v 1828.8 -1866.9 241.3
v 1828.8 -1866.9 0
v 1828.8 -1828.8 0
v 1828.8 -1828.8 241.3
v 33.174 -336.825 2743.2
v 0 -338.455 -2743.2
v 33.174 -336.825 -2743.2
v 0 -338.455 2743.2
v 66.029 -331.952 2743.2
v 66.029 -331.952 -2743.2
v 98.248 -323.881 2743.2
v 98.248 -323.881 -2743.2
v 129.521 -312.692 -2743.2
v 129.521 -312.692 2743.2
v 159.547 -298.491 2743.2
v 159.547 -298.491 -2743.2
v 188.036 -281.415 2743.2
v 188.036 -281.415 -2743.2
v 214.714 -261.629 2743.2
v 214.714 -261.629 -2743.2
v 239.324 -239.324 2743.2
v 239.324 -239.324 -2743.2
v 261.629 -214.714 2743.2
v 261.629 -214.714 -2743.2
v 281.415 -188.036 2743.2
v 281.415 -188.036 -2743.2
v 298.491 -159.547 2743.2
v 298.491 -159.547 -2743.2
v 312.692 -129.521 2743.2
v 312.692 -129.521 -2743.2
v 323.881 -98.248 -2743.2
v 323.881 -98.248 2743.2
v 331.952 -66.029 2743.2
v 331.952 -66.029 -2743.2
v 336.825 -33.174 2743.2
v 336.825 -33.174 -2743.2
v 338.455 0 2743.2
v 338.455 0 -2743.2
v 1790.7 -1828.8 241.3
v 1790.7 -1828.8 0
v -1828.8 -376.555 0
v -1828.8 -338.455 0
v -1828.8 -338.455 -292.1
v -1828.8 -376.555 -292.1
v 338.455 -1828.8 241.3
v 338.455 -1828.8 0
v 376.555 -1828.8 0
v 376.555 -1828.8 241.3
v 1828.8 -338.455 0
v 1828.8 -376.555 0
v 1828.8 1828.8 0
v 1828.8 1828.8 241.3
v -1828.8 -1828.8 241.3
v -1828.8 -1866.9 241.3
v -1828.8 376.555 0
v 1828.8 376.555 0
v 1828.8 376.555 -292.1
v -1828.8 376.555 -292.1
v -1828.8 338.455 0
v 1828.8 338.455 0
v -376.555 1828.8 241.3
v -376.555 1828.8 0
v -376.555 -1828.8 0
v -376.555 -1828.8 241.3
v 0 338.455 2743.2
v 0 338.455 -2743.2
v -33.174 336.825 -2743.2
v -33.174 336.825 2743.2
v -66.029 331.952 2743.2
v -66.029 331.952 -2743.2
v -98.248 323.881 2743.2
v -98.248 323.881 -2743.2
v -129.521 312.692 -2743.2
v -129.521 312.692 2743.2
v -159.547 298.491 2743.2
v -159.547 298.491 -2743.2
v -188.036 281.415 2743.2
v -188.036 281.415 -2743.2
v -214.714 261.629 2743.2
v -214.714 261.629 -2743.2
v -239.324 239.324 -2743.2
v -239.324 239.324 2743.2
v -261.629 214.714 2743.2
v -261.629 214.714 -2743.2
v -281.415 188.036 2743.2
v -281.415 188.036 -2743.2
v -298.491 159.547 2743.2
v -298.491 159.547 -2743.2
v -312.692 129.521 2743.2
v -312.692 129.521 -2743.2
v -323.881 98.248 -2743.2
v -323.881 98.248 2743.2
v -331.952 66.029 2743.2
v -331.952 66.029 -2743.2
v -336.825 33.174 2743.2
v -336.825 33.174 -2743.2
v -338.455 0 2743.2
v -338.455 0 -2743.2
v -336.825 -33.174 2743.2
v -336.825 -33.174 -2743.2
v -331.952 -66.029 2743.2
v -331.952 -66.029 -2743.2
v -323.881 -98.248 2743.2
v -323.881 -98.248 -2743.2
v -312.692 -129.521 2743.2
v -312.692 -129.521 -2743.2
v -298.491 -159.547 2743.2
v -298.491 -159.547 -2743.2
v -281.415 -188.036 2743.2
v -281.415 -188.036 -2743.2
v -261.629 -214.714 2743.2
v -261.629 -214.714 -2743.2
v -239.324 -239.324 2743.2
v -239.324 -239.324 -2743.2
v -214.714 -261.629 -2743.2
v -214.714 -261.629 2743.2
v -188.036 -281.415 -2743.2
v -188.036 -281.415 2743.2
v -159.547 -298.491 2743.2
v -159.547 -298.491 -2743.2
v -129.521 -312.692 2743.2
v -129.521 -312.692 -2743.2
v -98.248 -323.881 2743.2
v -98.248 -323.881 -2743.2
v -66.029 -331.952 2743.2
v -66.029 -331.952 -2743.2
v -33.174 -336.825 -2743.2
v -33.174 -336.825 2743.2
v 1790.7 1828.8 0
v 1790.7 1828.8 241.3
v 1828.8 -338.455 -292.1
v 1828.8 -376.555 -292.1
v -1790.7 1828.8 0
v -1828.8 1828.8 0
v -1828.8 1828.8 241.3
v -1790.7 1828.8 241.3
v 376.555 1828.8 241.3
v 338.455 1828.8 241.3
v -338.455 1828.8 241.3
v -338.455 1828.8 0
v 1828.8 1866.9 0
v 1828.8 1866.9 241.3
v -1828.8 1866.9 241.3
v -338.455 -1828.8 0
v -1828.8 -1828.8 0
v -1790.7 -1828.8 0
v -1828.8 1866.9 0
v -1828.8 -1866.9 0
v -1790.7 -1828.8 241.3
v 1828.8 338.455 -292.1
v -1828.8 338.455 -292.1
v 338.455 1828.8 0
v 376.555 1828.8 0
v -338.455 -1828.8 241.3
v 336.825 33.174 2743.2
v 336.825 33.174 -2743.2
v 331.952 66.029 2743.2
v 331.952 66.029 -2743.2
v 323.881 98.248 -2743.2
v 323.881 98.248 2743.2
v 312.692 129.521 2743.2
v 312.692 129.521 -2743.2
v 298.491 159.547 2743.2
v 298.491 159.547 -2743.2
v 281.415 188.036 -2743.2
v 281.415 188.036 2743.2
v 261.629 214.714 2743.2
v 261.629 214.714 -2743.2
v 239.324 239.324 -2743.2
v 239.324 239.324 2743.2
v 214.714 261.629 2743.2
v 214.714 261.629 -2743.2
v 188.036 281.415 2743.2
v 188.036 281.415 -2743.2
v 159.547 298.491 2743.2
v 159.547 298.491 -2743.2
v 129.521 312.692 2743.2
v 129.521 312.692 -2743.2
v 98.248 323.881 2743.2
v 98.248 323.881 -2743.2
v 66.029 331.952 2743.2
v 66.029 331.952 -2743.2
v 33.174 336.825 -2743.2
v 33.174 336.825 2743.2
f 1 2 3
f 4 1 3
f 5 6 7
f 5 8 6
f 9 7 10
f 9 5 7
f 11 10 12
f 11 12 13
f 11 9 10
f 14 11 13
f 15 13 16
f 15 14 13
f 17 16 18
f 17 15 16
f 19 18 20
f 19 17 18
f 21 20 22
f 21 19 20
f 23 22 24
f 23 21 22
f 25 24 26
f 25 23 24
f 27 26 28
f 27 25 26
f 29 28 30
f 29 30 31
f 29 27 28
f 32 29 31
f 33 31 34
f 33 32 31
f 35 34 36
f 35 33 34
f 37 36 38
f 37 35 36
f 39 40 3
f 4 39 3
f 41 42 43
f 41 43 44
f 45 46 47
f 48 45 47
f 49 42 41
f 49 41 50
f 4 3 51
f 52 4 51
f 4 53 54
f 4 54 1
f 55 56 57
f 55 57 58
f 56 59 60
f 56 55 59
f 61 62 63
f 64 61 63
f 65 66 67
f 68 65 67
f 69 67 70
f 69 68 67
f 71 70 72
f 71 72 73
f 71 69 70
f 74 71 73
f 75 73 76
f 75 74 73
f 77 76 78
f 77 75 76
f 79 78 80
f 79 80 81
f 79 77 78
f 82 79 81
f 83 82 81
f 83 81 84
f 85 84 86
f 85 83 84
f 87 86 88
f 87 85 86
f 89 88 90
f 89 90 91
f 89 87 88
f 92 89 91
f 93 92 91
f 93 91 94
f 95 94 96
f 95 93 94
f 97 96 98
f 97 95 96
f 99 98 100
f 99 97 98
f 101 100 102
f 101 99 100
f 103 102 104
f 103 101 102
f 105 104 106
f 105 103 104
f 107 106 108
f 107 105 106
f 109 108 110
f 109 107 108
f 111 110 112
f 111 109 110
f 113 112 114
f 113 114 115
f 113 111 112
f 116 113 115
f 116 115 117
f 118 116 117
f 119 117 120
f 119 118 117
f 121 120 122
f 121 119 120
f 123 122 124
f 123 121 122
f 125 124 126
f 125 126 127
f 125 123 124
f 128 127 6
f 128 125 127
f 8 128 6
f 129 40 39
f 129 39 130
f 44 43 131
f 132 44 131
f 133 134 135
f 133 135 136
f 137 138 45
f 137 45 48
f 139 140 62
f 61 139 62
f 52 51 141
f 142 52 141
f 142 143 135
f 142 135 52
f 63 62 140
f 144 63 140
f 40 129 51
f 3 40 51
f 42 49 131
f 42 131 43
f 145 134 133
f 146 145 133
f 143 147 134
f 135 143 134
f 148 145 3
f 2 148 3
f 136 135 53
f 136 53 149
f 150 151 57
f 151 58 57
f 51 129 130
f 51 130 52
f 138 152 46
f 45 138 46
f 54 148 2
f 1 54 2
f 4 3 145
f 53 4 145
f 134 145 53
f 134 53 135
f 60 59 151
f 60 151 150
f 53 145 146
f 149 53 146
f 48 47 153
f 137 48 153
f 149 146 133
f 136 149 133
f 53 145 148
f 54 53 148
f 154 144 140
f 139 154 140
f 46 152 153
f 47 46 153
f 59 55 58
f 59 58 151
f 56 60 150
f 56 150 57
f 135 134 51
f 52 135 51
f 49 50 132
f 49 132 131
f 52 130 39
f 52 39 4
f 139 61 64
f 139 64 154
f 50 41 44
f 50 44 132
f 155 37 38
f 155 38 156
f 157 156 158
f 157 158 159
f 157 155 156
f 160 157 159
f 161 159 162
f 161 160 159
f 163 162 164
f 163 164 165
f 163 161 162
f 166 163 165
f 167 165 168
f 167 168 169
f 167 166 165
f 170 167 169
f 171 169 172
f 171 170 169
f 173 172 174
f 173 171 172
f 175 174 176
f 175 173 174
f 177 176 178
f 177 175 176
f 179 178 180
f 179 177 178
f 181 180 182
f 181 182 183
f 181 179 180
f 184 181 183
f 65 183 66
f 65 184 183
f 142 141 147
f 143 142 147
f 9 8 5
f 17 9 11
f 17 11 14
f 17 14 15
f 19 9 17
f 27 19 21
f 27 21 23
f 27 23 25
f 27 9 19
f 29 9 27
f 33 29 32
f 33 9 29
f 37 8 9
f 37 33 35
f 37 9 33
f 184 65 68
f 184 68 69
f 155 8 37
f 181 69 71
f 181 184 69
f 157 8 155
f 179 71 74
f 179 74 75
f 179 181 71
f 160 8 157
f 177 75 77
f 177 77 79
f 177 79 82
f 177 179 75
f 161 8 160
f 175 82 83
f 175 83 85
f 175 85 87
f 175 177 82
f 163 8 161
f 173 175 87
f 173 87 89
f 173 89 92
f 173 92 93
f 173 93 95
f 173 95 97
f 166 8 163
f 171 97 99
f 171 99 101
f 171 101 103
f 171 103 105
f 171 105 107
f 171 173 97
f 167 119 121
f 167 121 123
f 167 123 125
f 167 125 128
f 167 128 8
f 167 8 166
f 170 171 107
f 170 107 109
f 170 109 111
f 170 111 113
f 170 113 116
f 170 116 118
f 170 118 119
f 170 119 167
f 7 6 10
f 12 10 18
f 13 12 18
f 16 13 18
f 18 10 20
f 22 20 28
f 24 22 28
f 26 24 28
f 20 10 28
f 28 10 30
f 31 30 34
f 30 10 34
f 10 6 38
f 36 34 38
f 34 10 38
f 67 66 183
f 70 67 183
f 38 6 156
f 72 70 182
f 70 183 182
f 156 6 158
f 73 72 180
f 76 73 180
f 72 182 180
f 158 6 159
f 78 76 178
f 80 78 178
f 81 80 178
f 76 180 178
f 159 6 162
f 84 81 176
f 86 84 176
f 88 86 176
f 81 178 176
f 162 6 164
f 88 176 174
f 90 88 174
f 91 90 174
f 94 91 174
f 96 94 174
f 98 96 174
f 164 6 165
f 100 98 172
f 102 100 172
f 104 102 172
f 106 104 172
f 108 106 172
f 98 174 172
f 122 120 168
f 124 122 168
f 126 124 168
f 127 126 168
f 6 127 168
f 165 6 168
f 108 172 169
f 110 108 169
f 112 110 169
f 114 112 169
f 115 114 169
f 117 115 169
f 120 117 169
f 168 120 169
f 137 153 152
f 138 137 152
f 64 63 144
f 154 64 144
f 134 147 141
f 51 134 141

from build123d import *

# Parameters (mm, degrees)
F1_DEPTH = 2743.2
F2_DEPTH = 292.1
F3_W     = 38.1
F3_H     = 3657.6
F4_DEPTH = 241.3
F5_DEPTH = 241.3


with BuildPart() as f1:
    # F0 (on Top) → F1 (new body, symmetric)
    with BuildSketch(Plane.XY):
        with BuildLine():
            ThreePointArc((0, -338.455), (239.323826, -239.323826), (338.455, 0))
            ThreePointArc((338.455, 0), (239.323825, 239.323826), (-1e-06, 338.455))
            ThreePointArc((-1e-06, 338.455), (-338.455, -1e-06), (0, -338.455))
        make_face()
    extrude(amount=F1_DEPTH, both=True)


with BuildPart() as f2:
    # F0 (on Top) → F2 (new body)
    with BuildSketch(Plane.XY):
        Polygon((1828.8, -338.455), (0, -338.455), (-1828.8, -338.455), (-1828.8, -376.555), (1828.8, -376.555), align=None)
        Polygon((-1828.8, 338.455), (-1e-06, 338.455), (1828.8, 338.455), (1828.8, 376.555), (-1828.8, 376.555), align=None)
    extrude(amount=-F2_DEPTH)


with BuildPart() as f4:
    # F3 (on Top) → F4 (new body)
    with BuildSketch(Plane.XY):
        with Locations((-1809.75, 0)):
            Rectangle(F3_W, F3_H)
        Polygon((-338.455, -1828.8), (-338.455, -2e-06), (-338.455, 1828.8), (-376.555, 1828.8), (-376.555, -1828.8), align=None)
        Polygon((338.455, 1828.8), (338.455, 0), (338.455, -1828.8), (376.555, -1828.8), (376.555, 1828.8), align=None)
        with Locations((1809.75, 0)):
            Rectangle(F3_W, F3_H)
    extrude(amount=F4_DEPTH)


with BuildPart() as f5:
    # F3 (on Top) → F5 (new body)
    with BuildSketch(Plane.XY):
        Polygon((376.555, -1828.8), (338.455, -1828.8), (-338.455, -1828.8), (-376.555, -1828.8), (-1790.7, -1828.8), (-1828.8, -1828.8), (-1828.8, -1866.9), (1828.8, -1866.9), (1828.8, -1828.8), (1790.7, -1828.8), align=None)
        Polygon((-338.455, 1828.8), (338.455, 1828.8), (376.555, 1828.8), (1790.7, 1828.8), (1828.8, 1828.8), (1828.8, 1866.9), (-1828.8, 1866.9), (-1828.8, 1828.8), (-1790.7, 1828.8), (-376.555, 1828.8), align=None)
    extrude(amount=F5_DEPTH)


solid = Compound([f1.part, f2.part, f4.part, f5.part])
